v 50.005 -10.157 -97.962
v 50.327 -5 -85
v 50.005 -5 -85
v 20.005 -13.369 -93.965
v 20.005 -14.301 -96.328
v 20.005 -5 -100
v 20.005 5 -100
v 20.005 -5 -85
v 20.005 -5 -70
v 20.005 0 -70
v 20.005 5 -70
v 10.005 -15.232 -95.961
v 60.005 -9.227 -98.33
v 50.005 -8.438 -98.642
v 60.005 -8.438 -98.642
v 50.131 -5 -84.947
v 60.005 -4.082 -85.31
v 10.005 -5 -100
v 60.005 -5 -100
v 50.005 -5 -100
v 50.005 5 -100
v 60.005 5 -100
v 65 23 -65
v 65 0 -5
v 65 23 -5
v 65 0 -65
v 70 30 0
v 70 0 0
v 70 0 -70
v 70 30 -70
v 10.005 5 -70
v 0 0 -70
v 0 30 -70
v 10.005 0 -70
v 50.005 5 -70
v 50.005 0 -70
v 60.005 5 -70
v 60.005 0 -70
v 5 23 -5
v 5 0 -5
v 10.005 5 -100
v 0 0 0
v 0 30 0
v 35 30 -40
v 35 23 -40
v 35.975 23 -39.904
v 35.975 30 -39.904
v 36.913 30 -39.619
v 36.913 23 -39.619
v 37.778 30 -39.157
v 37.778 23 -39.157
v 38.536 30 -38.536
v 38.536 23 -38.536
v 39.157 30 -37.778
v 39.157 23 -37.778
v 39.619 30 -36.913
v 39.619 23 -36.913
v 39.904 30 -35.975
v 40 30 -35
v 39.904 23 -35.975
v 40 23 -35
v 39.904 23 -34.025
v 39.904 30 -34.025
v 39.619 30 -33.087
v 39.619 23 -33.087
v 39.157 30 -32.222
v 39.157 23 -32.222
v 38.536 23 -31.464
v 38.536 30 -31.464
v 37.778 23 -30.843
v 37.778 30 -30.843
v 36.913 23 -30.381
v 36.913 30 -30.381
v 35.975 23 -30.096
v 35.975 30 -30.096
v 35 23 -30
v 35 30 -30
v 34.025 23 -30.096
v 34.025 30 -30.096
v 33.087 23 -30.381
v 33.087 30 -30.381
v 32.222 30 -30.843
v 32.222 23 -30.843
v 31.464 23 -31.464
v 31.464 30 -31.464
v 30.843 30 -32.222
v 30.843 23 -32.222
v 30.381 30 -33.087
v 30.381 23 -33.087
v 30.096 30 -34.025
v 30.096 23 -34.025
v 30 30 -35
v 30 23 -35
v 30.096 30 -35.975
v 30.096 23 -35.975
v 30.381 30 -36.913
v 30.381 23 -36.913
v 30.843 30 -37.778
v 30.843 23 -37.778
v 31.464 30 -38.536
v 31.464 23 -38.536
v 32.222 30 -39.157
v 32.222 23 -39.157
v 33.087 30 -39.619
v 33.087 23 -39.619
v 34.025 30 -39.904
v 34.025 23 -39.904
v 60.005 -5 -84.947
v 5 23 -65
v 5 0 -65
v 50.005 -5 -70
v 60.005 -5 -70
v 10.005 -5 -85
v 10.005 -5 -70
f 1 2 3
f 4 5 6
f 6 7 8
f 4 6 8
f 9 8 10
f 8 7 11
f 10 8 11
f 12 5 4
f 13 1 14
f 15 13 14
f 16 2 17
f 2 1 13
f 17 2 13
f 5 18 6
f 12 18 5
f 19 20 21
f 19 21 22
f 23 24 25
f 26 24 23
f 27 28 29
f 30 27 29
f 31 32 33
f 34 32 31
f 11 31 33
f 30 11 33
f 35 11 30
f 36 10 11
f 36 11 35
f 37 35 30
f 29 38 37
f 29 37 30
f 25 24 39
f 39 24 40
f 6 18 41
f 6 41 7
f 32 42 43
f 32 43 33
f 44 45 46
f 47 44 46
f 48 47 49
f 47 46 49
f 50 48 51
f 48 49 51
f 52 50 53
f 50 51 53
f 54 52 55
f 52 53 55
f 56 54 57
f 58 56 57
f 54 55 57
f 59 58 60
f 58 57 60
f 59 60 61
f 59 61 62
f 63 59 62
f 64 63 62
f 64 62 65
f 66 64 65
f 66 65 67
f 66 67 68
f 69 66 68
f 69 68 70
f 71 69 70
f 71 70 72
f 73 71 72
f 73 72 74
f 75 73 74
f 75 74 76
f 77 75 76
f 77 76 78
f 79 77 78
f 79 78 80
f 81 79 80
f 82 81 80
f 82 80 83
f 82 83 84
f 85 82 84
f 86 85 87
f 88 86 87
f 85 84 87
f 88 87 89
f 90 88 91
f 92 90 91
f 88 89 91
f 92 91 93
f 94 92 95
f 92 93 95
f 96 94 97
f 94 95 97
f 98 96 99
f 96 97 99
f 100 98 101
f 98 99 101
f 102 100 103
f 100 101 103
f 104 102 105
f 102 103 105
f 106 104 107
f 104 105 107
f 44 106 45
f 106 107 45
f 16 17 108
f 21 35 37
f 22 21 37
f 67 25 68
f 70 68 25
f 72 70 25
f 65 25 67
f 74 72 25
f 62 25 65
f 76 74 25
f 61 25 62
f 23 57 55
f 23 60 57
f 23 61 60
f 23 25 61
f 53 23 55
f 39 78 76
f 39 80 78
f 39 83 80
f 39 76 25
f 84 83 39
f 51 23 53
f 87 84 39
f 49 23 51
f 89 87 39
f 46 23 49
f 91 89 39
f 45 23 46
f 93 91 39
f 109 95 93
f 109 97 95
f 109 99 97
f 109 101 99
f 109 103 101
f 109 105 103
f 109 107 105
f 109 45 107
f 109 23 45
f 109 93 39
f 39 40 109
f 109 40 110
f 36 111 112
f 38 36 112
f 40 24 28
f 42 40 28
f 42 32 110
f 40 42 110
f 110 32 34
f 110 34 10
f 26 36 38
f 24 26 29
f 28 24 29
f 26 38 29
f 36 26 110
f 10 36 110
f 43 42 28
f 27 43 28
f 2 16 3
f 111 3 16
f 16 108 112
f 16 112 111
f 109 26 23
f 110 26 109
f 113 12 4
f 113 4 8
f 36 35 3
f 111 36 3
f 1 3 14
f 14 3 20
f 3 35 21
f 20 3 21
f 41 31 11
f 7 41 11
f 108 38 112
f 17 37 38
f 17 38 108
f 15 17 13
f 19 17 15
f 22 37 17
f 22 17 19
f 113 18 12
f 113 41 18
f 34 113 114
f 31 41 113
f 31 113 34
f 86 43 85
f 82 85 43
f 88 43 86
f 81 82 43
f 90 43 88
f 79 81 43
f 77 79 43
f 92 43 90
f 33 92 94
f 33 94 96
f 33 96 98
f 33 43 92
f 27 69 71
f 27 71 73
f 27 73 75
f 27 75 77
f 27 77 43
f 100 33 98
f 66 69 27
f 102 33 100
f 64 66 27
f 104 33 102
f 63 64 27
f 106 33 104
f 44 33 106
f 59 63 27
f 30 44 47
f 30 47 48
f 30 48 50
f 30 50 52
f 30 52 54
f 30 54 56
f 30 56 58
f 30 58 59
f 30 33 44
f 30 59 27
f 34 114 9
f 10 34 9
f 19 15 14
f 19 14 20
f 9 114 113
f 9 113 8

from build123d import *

# Parameters (mm, degrees)
ESQUISSE1_W              = 70
ESQUISSE1_H              = 70
BOSS_EXTRU_4_DEPTH       = 30
ESQUISSE5_W              = 60
ESQUISSE5_H              = 60
ENL_V_MAT_EXTRU_3_DEPTH  = 23
ESQUISSE6_R              = 5
ENL_V_MAT_EXTRU_4_DEPTH  = 23
ESQUISSE28_W             = 10
ESQUISSE28_H             = 30
BOSS_EXTRU_8_DEPTH       = 5
BOSS_EXTRU_9_DEPTH       = 10
ESQUISSE30_W             = 10
ESQUISSE30_H             = 30
BOSS_EXTRU_10_DEPTH      = 5
BOSS_EXTRU_14_DEPTH      = 10
ENL_V_MAT_EXTRU_6_DEPTH  = 10
ENL_V_MAT_EXTRU_15_DEPTH = 14


with BuildPart() as part:
    # Esquisse1 → Boss.-Extru.4 (new body)
    with BuildSketch(Plane(origin=(0, 0, 0), x_dir=(1, 0, 0), z_dir=(0, 1, 0))):
        with Locations((35, 35)):
            Rectangle(ESQUISSE1_W, ESQUISSE1_H)
    extrude(amount=BOSS_EXTRU_4_DEPTH)

    # Esquisse5 → Enlèv. mat.-Extru.3 (cut)
    with BuildSketch(Plane(origin=(0, 0, 0), x_dir=(-1, 0, 0), z_dir=(0, -1, 0))):
        with Locations((-35, 35)):
            Rectangle(ESQUISSE5_W, ESQUISSE5_H)
    extrude(amount=-ENL_V_MAT_EXTRU_3_DEPTH, mode=Mode.SUBTRACT)

    # Esquisse6 → Enlèv. mat.-Extru.4 (cut)
    with BuildSketch(Plane(origin=(0, 23, 0), x_dir=(-1, 0, 0), z_dir=(0, -1, 0))):
        with Locations(Location((-35, 35, 0), (0, 0, 90))):
            Circle(ESQUISSE6_R)
    extrude(amount=-ENL_V_MAT_EXTRU_4_DEPTH, mode=Mode.SUBTRACT)

    # Esquisse28 → Boss.-Extru.8 (add, symmetric)
    with BuildSketch(Plane.XZ):
        with Locations((55.004966989, -85)):
            Rectangle(ESQUISSE28_W, ESQUISSE28_H)
    extrude(amount=BOSS_EXTRU_8_DEPTH, both=True)

    # Esquisse29 → Boss.-Extru.9 (add)
    with BuildSketch(Plane(origin=(60.004966989, 0, 0), x_dir=(0, 0, -1), z_dir=(1, 0, 0))):
        Polygon((98.641624501, -8.437704854), (100, -5), (85, -5), (97.962436751, -10.156557281), align=None)
    extrude(amount=-BOSS_EXTRU_9_DEPTH)

    # Esquisse30 → Boss.-Extru.10 (add, symmetric)
    with BuildSketch(Plane.XZ):
        with Locations((15.004966989, -85)):
            Rectangle(ESQUISSE30_W, ESQUISSE30_H)
    extrude(amount=BOSS_EXTRU_10_DEPTH, both=True)

    # Esquisse39 → Boss.-Extru.14 (add)
    with BuildSketch(Plane.ZY.offset(-10.004966989)):
        Polygon((-100, -5), (-95.960946885, -15.231620103), (-85, -5), align=None)
    extrude(amount=-BOSS_EXTRU_14_DEPTH)

    # Esquisse40 → Enlèv. mat.-Extru.6 (cut)
    with BuildSketch(Plane(origin=(0, -34.827896321, -88.22508495), x_dir=(-1, 0, 0), z_dir=(0, -0.3671866467775486, -0.930147282116257))):
        Polygon((-20.004966989, 21.067928267), (-20.004966989, 22.067928267), (-10.004966989, 21.067928267), align=None)
    extrude(amount=-ENL_V_MAT_EXTRU_6_DEPTH, mode=Mode.SUBTRACT)

    # Esquisse41 → Enlèv. mat.-Extru.15 (cut)
    with BuildSketch(Plane(origin=(0, -34.85291455, -88.203912367), x_dir=(-1, 0, 0), z_dir=(0, -0.36749110102927884, -0.9300270375985252))):
        Polygon((-60.004966989, 27.554450861), (-60.004966989, 26.554450861), (-50.004966989, 26.554450861), align=None)
    extrude(amount=-ENL_V_MAT_EXTRU_15_DEPTH, mode=Mode.SUBTRACT)


solid = part.part
